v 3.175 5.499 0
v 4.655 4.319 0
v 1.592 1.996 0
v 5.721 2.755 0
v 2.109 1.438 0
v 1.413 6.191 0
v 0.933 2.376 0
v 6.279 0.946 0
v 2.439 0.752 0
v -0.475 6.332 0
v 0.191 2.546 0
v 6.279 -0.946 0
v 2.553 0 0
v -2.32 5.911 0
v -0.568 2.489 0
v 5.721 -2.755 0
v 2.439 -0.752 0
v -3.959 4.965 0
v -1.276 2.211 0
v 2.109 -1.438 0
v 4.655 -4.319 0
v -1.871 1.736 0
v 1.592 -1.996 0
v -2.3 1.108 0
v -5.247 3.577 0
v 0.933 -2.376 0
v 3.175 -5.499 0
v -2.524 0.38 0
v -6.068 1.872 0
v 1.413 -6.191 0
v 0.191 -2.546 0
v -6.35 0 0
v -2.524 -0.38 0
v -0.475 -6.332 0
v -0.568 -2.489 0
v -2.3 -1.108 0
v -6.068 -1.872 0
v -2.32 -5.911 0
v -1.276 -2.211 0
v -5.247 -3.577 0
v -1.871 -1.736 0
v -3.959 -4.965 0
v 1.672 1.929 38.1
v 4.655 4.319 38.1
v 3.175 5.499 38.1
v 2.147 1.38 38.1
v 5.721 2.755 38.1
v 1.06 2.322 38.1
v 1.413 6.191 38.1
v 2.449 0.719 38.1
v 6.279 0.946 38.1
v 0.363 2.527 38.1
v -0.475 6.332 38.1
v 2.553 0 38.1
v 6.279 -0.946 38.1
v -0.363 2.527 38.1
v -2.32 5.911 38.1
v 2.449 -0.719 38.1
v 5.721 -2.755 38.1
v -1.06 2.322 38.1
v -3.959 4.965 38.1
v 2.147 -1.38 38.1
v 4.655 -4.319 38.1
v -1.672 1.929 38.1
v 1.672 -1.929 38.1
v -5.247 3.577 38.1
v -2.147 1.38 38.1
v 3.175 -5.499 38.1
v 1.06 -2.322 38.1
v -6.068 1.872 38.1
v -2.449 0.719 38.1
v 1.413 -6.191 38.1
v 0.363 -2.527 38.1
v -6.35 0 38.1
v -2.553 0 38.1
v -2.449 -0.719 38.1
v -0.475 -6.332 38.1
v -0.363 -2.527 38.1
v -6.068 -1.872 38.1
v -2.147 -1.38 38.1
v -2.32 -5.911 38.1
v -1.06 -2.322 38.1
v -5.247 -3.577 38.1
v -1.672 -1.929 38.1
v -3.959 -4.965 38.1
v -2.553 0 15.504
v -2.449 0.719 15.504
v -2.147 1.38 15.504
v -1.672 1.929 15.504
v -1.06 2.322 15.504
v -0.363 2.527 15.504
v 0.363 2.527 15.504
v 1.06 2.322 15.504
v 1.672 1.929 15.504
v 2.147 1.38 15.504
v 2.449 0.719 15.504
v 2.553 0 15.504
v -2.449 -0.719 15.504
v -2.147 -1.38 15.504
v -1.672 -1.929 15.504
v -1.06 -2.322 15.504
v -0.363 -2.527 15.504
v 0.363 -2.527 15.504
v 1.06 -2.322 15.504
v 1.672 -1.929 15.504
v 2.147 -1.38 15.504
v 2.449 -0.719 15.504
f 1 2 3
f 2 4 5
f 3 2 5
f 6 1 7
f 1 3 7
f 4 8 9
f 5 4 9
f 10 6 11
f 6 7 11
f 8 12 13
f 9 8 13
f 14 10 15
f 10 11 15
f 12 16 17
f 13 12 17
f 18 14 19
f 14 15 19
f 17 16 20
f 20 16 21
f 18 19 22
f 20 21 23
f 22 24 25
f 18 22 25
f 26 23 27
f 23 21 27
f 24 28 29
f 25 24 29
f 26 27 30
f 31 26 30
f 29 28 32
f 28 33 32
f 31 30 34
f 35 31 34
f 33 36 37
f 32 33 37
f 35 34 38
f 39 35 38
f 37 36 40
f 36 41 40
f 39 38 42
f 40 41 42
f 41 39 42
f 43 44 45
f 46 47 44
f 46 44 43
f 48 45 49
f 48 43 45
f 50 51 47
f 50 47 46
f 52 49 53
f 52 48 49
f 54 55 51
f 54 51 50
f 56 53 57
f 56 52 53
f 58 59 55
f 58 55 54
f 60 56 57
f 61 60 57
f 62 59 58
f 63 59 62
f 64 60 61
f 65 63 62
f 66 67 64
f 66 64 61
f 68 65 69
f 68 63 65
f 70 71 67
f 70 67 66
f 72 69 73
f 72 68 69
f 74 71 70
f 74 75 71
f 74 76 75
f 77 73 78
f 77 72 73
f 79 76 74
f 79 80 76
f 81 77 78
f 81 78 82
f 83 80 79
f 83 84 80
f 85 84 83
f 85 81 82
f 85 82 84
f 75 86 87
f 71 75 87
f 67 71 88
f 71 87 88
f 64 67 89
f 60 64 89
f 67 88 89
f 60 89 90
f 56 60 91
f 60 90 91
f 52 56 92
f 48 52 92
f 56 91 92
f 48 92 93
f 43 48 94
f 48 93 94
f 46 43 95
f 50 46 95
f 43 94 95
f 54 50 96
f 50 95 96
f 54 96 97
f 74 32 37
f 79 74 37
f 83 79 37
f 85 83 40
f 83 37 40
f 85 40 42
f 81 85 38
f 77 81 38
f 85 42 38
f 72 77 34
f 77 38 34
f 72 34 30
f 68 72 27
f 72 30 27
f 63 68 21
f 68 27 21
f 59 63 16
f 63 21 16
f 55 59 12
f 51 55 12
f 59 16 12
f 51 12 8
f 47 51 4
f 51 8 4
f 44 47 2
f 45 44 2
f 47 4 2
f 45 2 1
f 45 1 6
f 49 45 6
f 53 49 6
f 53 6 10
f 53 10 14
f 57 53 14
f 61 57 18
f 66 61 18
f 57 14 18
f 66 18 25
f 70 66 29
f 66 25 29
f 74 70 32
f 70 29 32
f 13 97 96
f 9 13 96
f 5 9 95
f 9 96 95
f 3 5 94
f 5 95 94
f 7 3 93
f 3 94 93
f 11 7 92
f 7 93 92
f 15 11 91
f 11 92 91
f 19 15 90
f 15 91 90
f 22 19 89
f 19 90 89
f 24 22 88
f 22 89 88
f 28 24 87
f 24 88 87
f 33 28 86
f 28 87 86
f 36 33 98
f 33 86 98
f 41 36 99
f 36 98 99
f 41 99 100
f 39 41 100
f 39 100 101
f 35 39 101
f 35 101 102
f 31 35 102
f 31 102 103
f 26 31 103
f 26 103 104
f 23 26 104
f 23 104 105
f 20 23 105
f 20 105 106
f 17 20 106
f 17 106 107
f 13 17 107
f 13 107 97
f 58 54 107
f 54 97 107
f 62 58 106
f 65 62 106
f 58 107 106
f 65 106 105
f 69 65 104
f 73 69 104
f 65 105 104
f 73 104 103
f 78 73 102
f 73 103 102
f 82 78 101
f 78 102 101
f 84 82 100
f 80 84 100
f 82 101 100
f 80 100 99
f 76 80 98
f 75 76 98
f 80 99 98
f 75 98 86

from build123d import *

# Parameters (mm, degrees)
SKETCH1_R                   = 6.35
HANDLE_BASE_DEPTH           = 38.1
F_1_4_20_TAPPED_HOLE1_D     = 5.1054
F_1_4_20_TAPPED_HOLE1_DEPTH = 22.596183098
F_1_4_20_TAPPED_HOLE1_TIP   = 1.533816902
SKETCH2_R                   = 2.5527
CUT_EXTRUDE1_DEPTH          = 40.144028919


with BuildPart() as part:
    # Sketch1 → Handle Base (new body)
    with BuildSketch(Plane.XY):
        with Locations(Location((0, 0, 0), (0, 0, 180))):
            Circle(SKETCH1_R)
    extrude(amount=HANDLE_BASE_DEPTH)

    # 1/4-20 Tapped Hole1
    with Locations(Plane.XY.offset(38.1)):
        with Locations((0, 0)):
            Hole(F_1_4_20_TAPPED_HOLE1_D / 2, depth=F_1_4_20_TAPPED_HOLE1_DEPTH)
            with Locations((0, 0, -(F_1_4_20_TAPPED_HOLE1_DEPTH + F_1_4_20_TAPPED_HOLE1_TIP / 2))):  # 118° drill point
                Cone(0, F_1_4_20_TAPPED_HOLE1_D / 2, F_1_4_20_TAPPED_HOLE1_TIP, mode=Mode.SUBTRACT)

    # Sketch2 → Cut-Extrude1 (cut, through all)
    with BuildSketch(Plane.XY.offset(38.1)):
        Circle(SKETCH2_R)
    extrude(amount=-CUT_EXTRUDE1_DEPTH, mode=Mode.SUBTRACT)


solid = part.part
